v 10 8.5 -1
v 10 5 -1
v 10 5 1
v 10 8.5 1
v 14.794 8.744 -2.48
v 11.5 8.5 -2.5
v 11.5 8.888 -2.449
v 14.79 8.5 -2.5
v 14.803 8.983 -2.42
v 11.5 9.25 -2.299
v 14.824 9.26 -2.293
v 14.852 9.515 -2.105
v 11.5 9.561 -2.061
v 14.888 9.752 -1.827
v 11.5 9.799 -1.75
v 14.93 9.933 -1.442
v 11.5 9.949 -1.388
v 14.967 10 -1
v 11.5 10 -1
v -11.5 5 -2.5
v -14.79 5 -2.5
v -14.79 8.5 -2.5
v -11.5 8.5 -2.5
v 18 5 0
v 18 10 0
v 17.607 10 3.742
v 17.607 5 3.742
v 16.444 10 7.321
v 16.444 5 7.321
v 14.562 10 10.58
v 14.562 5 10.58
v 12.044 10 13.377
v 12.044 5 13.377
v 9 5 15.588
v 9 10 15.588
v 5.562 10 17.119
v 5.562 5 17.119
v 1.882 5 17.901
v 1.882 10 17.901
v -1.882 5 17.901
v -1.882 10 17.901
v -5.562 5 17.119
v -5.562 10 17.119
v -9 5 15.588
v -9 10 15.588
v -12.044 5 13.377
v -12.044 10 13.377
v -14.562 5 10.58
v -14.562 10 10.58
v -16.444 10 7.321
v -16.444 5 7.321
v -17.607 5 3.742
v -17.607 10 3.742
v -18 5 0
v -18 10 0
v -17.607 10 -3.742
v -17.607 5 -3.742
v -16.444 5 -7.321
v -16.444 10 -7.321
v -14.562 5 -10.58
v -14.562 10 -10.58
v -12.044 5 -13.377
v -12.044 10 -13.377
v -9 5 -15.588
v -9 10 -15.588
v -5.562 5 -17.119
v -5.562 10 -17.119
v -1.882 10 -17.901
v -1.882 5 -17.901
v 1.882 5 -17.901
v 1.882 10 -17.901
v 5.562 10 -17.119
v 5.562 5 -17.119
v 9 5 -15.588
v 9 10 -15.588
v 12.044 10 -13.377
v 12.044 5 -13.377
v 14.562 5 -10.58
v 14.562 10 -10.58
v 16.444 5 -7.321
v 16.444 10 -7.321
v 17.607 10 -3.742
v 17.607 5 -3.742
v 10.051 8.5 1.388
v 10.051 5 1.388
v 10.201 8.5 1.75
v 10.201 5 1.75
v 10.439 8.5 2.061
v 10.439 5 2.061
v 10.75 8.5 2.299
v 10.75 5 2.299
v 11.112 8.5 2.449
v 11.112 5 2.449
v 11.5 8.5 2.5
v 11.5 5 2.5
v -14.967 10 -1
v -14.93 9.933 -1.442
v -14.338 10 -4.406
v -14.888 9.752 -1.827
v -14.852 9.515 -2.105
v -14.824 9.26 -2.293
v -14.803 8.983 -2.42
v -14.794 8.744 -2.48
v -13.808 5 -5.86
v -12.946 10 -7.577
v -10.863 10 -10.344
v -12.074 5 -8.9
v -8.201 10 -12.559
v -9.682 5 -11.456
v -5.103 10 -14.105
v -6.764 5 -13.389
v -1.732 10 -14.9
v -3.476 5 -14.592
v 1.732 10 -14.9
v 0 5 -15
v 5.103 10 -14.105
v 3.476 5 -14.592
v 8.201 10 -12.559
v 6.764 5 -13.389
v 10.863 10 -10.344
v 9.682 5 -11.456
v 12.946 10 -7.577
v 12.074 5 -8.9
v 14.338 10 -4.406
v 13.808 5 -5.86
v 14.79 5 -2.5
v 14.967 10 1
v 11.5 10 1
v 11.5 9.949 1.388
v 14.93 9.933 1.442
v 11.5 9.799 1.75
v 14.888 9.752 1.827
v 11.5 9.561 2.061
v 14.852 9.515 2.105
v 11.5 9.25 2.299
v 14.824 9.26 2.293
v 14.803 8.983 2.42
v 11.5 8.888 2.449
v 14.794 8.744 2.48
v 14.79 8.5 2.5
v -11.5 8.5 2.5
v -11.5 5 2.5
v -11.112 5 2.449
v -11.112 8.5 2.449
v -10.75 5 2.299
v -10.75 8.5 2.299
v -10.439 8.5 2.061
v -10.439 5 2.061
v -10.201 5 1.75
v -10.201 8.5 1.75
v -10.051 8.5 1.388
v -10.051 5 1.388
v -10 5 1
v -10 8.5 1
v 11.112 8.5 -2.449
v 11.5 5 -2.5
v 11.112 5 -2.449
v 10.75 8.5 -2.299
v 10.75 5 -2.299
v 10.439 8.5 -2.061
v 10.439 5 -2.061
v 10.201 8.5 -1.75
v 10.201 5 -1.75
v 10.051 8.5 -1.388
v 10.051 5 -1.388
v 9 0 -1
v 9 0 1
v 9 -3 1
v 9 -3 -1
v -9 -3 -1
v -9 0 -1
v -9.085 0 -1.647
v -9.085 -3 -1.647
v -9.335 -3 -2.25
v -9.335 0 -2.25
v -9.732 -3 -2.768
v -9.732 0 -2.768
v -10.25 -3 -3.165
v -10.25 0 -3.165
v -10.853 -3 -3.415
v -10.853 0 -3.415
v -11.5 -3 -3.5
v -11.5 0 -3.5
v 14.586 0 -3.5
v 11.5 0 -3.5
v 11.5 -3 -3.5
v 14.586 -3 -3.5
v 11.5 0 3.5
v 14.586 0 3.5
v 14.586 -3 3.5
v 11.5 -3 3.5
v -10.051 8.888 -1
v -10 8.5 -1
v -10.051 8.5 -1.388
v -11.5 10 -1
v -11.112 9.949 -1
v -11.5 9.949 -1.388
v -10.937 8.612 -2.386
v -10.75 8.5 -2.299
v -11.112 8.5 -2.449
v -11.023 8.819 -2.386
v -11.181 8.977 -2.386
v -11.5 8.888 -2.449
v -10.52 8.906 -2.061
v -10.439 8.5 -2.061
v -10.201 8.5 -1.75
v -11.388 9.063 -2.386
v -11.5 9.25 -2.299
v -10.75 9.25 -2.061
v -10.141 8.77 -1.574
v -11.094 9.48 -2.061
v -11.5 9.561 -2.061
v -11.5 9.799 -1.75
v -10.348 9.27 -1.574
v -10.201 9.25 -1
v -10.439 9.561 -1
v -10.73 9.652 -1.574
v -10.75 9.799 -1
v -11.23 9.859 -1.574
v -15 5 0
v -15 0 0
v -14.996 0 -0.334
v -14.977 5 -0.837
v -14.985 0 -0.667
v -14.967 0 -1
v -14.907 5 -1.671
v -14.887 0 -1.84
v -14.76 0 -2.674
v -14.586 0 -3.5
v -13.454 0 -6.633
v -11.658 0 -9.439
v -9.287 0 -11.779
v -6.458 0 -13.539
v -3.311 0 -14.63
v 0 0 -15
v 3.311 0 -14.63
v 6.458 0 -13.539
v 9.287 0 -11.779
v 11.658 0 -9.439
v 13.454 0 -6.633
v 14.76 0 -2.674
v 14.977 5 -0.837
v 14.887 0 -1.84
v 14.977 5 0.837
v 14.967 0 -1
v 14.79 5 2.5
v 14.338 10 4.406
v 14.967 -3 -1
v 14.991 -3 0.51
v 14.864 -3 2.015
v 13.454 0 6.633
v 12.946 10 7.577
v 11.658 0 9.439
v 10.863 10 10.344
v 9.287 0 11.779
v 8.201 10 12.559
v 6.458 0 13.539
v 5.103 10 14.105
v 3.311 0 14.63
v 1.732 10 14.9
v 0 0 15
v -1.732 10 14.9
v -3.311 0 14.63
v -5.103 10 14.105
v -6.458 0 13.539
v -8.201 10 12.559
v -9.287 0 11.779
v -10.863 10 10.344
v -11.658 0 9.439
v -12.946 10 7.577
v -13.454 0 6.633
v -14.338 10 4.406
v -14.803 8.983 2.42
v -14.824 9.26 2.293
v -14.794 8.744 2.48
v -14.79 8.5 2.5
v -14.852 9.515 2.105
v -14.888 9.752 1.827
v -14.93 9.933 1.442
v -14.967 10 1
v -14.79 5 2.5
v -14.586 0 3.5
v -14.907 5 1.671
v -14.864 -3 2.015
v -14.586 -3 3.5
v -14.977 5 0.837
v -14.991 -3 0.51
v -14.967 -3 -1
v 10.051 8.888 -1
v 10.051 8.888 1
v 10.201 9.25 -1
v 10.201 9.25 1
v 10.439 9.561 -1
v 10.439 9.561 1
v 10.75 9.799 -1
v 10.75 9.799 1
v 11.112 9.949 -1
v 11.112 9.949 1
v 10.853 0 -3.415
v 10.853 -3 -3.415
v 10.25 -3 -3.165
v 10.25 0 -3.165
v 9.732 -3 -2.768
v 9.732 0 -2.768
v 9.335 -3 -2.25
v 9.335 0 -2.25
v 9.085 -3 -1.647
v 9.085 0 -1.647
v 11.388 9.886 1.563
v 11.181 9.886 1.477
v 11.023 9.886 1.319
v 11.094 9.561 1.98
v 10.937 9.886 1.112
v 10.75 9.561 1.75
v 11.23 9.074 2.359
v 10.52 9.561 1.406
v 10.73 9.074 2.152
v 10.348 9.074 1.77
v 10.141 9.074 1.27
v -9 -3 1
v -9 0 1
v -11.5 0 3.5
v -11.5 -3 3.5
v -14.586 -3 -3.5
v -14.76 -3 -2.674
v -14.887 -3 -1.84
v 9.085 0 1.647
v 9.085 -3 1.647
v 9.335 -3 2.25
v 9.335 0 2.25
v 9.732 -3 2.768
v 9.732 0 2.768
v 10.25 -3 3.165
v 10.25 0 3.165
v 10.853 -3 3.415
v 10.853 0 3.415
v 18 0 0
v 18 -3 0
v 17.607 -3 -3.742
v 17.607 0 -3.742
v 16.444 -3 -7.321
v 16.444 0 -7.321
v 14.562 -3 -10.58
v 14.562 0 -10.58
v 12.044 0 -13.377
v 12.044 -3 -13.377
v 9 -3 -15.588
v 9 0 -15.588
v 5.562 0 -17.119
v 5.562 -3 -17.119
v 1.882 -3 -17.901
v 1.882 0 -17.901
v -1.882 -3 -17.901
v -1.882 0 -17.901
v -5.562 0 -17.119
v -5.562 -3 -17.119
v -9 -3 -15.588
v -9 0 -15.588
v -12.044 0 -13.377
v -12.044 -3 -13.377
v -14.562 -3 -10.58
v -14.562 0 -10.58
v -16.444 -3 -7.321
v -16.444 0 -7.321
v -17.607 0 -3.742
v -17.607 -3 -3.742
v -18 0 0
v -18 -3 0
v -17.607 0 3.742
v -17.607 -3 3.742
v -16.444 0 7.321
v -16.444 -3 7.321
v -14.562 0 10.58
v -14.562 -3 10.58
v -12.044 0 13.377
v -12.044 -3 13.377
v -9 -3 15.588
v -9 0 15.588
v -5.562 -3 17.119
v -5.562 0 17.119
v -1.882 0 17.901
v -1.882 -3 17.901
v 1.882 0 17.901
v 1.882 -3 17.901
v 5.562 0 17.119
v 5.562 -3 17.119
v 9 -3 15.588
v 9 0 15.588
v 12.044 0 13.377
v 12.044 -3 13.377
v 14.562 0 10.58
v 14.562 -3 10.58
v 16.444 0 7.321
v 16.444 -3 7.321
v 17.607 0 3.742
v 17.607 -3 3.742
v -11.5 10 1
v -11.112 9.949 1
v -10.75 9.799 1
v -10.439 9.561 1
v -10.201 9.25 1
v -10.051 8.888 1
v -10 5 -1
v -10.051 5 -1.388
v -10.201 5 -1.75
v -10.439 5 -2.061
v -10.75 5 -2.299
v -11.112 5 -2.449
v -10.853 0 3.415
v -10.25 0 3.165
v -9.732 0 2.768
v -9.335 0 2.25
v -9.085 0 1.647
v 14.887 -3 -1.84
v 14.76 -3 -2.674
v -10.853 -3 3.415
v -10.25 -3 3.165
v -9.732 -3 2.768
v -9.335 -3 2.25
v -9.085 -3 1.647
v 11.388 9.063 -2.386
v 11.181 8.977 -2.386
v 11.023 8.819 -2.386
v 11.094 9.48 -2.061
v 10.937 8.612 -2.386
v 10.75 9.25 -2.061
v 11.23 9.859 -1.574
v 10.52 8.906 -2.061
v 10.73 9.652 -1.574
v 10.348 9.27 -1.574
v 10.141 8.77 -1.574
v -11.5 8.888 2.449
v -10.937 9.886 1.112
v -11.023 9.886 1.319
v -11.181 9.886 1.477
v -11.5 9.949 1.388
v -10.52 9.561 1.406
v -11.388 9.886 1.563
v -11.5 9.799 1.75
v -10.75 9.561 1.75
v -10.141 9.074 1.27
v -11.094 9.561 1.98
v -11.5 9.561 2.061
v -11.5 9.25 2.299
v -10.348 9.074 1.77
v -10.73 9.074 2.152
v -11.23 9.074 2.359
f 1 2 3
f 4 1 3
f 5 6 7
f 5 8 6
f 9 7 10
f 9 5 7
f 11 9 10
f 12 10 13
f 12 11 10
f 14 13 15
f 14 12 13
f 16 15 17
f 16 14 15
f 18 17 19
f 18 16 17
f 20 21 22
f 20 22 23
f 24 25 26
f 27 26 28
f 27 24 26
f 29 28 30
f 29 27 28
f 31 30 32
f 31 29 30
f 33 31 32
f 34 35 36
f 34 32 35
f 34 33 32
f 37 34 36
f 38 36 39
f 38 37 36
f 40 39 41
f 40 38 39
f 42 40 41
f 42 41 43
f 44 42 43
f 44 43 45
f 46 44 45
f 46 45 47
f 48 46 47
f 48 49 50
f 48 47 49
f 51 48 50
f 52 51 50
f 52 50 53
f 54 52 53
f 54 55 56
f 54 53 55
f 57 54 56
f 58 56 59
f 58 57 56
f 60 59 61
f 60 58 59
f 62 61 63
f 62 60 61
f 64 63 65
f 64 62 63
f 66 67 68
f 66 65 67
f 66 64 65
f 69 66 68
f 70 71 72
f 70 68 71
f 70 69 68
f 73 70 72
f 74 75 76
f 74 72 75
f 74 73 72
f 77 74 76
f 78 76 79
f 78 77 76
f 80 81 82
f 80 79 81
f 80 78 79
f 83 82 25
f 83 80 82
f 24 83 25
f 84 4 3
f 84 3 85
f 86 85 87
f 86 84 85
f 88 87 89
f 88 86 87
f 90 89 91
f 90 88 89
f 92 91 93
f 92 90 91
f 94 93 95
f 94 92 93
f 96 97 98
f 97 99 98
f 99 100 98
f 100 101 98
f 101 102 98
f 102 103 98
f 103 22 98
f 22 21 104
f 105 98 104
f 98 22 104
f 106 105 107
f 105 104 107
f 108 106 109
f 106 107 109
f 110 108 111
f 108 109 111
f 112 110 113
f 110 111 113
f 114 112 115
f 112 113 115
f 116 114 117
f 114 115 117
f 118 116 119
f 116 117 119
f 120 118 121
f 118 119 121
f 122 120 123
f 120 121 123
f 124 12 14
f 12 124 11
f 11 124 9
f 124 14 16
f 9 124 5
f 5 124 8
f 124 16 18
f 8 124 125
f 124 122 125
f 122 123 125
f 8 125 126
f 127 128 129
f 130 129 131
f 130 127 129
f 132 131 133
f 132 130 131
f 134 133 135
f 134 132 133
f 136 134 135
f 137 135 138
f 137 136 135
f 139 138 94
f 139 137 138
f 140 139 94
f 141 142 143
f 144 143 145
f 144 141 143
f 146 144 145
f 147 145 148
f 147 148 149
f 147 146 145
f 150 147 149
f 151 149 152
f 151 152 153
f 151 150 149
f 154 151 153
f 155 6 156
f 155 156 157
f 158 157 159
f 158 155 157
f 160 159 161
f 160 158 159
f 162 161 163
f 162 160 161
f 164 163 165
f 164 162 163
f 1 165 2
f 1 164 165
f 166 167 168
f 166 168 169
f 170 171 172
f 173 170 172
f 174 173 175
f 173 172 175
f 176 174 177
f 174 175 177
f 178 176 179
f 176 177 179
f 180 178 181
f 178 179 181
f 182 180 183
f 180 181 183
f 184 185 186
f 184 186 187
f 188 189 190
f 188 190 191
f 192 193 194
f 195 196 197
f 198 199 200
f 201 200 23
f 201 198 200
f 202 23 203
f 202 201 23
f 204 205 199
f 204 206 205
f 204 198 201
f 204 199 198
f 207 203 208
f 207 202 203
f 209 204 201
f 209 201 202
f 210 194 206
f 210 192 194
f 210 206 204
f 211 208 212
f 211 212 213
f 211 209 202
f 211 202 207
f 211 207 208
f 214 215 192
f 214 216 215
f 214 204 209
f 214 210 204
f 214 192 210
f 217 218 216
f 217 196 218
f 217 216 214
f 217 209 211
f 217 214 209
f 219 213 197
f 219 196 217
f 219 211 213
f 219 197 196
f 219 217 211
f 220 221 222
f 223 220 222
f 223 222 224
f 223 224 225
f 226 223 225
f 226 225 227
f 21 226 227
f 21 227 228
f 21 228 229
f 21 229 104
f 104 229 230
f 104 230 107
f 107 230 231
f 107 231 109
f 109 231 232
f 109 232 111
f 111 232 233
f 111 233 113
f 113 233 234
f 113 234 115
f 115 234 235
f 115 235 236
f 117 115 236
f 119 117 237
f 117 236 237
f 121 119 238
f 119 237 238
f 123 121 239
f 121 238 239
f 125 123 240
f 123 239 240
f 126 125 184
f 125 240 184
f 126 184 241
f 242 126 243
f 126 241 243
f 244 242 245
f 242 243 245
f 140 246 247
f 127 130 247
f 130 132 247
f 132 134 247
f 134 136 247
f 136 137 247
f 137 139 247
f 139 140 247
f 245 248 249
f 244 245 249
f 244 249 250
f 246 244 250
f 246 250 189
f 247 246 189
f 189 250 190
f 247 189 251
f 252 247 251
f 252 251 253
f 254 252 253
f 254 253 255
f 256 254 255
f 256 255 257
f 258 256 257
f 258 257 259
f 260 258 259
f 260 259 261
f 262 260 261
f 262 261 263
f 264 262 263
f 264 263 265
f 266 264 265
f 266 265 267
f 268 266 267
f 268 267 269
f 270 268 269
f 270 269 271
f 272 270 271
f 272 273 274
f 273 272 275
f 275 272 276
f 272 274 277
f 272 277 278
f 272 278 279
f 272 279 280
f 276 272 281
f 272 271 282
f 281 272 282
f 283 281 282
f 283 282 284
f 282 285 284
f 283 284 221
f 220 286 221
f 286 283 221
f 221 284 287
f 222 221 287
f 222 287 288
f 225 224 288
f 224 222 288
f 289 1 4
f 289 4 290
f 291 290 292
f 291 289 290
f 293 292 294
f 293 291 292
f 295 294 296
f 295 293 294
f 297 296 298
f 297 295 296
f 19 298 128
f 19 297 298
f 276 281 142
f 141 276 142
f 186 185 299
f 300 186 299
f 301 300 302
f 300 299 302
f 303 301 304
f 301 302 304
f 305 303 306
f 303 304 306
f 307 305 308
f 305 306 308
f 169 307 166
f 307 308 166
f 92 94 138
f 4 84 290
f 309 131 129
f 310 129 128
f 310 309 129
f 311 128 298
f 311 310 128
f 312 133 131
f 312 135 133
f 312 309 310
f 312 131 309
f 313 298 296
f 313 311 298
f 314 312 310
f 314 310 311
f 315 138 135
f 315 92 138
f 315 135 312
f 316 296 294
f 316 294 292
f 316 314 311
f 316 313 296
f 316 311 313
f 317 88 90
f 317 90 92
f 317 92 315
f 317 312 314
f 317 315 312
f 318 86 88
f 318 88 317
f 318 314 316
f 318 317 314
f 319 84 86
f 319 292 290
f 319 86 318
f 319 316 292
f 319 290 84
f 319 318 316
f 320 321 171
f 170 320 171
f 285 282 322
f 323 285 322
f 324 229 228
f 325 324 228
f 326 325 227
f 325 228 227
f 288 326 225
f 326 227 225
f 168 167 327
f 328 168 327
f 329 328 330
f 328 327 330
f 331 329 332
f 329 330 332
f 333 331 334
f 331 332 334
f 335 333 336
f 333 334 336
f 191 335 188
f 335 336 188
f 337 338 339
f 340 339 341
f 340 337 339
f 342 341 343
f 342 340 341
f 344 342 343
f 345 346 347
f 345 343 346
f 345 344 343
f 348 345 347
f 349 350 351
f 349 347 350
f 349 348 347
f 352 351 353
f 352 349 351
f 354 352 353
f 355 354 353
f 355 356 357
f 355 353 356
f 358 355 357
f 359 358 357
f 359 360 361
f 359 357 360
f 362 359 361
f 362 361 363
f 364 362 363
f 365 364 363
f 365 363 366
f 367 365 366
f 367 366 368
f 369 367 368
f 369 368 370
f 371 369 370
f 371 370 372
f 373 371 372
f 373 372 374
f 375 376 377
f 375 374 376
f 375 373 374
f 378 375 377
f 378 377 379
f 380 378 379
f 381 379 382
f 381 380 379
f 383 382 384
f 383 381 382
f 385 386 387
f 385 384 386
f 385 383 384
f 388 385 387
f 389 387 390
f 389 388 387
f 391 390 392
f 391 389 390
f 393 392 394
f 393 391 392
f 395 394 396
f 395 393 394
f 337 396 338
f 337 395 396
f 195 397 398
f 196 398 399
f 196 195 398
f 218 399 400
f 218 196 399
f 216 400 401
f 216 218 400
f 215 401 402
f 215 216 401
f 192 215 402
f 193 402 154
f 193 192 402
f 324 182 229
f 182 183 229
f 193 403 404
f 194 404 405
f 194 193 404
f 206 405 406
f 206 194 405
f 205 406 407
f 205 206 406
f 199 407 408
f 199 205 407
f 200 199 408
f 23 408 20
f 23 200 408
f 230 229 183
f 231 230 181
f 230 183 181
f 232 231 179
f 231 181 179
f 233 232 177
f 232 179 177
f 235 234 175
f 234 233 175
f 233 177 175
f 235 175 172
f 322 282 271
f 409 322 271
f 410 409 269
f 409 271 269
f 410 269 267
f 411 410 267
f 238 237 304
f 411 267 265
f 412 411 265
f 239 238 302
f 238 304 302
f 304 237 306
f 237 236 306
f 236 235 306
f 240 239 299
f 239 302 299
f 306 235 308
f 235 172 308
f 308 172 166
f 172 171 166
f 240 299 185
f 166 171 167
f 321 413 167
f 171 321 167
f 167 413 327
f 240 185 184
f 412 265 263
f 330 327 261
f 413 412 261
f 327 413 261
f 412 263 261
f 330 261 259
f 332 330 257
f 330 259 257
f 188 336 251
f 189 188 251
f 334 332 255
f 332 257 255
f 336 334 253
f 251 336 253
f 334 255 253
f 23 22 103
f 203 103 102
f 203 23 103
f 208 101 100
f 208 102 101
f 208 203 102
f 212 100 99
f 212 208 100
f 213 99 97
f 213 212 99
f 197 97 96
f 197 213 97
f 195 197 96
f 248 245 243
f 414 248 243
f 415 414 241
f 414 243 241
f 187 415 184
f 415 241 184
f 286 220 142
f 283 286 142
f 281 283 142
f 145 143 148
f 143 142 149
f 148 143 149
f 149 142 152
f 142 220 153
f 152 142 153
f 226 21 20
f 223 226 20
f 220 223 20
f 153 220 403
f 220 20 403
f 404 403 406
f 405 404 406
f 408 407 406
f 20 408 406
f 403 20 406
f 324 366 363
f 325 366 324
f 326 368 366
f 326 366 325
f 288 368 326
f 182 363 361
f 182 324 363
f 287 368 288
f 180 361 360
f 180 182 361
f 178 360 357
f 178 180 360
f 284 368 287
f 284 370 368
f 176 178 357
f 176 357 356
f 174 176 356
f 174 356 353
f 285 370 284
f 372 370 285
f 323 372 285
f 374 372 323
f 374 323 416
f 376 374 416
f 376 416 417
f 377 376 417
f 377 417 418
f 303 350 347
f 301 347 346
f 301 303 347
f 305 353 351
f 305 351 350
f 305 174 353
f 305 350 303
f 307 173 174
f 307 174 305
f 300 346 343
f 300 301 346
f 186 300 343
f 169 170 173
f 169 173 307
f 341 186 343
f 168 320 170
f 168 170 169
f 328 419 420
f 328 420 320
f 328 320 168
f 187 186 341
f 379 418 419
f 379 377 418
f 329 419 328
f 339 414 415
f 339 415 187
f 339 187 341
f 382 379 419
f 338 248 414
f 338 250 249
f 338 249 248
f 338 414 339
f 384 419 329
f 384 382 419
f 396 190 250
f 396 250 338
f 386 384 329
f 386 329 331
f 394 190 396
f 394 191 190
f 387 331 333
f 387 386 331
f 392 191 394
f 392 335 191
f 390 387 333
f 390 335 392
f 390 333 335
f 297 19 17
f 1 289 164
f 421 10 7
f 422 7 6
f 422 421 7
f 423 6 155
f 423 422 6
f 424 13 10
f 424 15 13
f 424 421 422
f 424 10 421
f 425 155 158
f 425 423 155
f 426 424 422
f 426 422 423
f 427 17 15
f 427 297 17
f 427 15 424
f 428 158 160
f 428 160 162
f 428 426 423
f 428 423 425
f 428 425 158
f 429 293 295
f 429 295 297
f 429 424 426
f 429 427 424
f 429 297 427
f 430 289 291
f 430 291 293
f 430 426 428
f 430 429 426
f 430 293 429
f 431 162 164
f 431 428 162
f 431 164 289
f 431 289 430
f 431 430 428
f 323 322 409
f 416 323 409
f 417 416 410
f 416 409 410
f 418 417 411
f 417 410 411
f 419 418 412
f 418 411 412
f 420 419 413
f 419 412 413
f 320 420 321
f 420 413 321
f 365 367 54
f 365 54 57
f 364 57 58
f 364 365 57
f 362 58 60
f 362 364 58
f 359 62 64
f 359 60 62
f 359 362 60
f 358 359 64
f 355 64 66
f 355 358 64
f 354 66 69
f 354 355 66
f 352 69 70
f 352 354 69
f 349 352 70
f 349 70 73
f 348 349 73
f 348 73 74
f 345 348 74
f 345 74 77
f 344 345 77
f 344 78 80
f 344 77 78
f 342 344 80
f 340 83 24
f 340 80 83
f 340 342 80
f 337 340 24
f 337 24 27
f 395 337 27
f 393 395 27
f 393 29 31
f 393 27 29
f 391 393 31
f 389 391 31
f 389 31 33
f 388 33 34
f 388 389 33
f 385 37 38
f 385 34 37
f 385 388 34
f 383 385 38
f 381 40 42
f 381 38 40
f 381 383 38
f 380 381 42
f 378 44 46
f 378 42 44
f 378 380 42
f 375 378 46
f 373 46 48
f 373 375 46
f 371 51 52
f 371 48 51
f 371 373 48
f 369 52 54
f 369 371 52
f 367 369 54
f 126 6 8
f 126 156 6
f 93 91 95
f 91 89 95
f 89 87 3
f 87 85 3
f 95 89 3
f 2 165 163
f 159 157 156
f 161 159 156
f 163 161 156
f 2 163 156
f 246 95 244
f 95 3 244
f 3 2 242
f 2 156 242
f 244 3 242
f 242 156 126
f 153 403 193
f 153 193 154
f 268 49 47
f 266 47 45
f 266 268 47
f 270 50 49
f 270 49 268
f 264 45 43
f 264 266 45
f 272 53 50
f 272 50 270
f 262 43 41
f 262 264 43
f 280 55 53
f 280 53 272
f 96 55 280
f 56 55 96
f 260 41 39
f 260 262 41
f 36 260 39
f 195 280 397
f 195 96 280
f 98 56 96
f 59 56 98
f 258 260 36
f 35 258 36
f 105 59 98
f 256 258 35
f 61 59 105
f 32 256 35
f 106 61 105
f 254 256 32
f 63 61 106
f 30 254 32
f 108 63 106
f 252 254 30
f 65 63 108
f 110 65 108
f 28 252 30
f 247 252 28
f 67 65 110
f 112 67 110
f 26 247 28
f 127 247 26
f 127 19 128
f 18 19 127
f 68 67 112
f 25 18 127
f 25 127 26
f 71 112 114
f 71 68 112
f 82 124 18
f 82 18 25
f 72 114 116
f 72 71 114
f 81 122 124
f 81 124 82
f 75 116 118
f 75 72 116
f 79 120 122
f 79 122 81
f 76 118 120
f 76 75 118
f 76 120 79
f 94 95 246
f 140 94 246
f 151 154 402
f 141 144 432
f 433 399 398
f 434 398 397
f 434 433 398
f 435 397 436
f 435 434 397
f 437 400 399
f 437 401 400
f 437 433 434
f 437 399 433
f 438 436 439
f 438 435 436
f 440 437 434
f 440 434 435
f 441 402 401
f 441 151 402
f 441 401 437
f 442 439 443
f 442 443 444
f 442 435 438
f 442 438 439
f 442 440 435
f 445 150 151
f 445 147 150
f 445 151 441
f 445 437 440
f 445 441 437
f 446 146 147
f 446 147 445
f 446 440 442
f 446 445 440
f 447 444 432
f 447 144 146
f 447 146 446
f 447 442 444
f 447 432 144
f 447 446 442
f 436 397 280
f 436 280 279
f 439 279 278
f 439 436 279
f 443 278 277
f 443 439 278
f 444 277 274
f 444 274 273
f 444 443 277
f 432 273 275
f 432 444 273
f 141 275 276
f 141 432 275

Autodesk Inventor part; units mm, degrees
ref_plane "YZ Plane" through (0, 0, 0) normal (1, 0, 0) x (0, 1, 0)
ref_plane "XZ Plane" through (0, 0, 0) normal (0, 1, 0) x (-1, 0, 0)
ref_plane "XY Plane" through (0, 0, 0) normal (0, 0, 1) x (1, 0, 0)
sketch "Sketch5" plane through (0, 0, 0) normal (0, 1, 0) x (-1, 0, 0)
  circle A0 centre (0, 0) radius 15
  circle A1 centre (0, 0) radius 18
  dimension "d18" = 30
  dimension "d19" = 36
extrude "Extrusion4" add sketch "Sketch5" along normal blind 5
sketch "Sketch6" plane through (0, 0, 0) normal (0, -1, 0) x (1, 0, 0)
  circle A0 centre (0, 0) radius 15 projected
  circle A1 centre (0, 0) radius 18 projected
extrude "Extrusion5" add sketch "Sketch6" along normal blind 3 contours A0 | A1
sketch "Sketch7" plane through (0, 5, 0) normal (0, 1, 0) x (1, 0, 0)
  circle A0 centre (0, 0) radius 15 projected
  circle A1 centre (0, 0) radius 18 projected
  line L0 (-17.8255, 2.5) -> (17.8255, 2.5)
  line L1 (-17.8255, -2.5) -> (17.8255, -2.5)
  circle A2 centre (0, 0) radius 10
  line L2 (-10, 2.5) -> (-10, -2.5)
  line L3 (10, 2.5) -> (10, -2.5)
  point P0 (0, 2.5)
  point P1 (-14.7902, 2.5)
  point P2 (14.7902, 2.5)
  point P3 (14.7902, -2.5)
  point P4 (-14.7902, -2.5)
  dimension "d24" = 2.5
  dimension "d25" = 20
extrude "Extrusion6" add sketch "Sketch7" along normal blind 5 contours A0 L1 L3 L0 | A0 L0 A1 L1 | A0 L0 A1 | L1 A1 A0 | L0 L2 L1 A0 | A0 L1 A1 L0
fillet "Fillet1" radius 1.5 10 edges at (-10, 7.5, 2.5) (-10, 10, 0) (10, 7.5, 2.5) (10, 10, 0) (10, 7.5, -2.5) (-10, 7.5, -2.5) (12.3951, 10, 2.5) (12.3951, 10, -2.5) (-12.3951, 10, 2.5) (-12.3951, 10, -2.5)
sketch "Sketch8" plane through (0, 0, 0) normal (0, 1, 0) x (1, 0, 0)
  arc A0 (-10, 1) -> (-11.5, 2.5) centre (-11.5, 1) ccw projected
  line L0 (-11.5, 2.5) -> (-14.7902, 2.5) projected
  line L1 (-10, -1) -> (-10, 1) projected
  arc A1 (-11.5, -2.5) -> (-10, -1) centre (-11.5, -1) ccw projected
  line L2 (-14.7902, -2.5) -> (-11.5, -2.5) projected
  line L3 (11.5, -2.5) -> (14.7902, -2.5) projected
  arc A2 (10, -1) -> (11.5, -2.5) centre (11.5, -1) ccw projected
  line L4 (10, 1) -> (10, -1) projected
  arc A3 (11.5, 2.5) -> (10, 1) centre (11.5, 1) ccw projected
  line L5 (14.7902, 2.5) -> (11.5, 2.5) projected
  arc A4 (14.9666, 1) -> (-14.9666, 1) centre (0, 0) ccw projected
  line L6 (-14.7902, -3.5) -> (-11.5, -3.5)
  arc A5 (-11.5, -3.5) -> (-9, -1) centre (-11.5, -1) ccw
  line L7 (-9, -1) -> (-9, 1)
  arc A6 (-9, 1) -> (-11.5, 3.5) centre (-11.5, 1) ccw
  line L8 (-11.5, 3.5) -> (-14.7902, 3.5)
  line L9 (14.7902, -3.5) -> (11.5, -3.5)
  arc A7 (9, -1) -> (11.5, -3.5) centre (11.5, -1) ccw
  line L10 (9, -1) -> (9, 1)
  arc A8 (11.5, 3.5) -> (9, 1) centre (11.5, 1) ccw
  line L11 (11.5, 3.5) -> (14.7902, 3.5)
  circle A9 centre (0, 0) radius 15 projected
  point P0 (14.586, 3.5)
  point P1 (14.586, -3.5)
  point P2 (-14.586, -3.5)
  point P3 (-14.586, 3.5)
  dimension "d29" = 1
  dimension "d30" = 1
extrude "Extrusion7" cut sketch "Sketch8" against normal through all contours L1 A1 L2 A9 A4 L0 A0 | A0 L0 A4 L8 A6 L7 A5 L6 A9 L2 A1 L1 | A4 L5 A3 L4 A2 L3 A9 L9 A7 L10 A8 L11 | A4 A9 L3 A2 L4 A3 L5
properties part number "Tapa"
